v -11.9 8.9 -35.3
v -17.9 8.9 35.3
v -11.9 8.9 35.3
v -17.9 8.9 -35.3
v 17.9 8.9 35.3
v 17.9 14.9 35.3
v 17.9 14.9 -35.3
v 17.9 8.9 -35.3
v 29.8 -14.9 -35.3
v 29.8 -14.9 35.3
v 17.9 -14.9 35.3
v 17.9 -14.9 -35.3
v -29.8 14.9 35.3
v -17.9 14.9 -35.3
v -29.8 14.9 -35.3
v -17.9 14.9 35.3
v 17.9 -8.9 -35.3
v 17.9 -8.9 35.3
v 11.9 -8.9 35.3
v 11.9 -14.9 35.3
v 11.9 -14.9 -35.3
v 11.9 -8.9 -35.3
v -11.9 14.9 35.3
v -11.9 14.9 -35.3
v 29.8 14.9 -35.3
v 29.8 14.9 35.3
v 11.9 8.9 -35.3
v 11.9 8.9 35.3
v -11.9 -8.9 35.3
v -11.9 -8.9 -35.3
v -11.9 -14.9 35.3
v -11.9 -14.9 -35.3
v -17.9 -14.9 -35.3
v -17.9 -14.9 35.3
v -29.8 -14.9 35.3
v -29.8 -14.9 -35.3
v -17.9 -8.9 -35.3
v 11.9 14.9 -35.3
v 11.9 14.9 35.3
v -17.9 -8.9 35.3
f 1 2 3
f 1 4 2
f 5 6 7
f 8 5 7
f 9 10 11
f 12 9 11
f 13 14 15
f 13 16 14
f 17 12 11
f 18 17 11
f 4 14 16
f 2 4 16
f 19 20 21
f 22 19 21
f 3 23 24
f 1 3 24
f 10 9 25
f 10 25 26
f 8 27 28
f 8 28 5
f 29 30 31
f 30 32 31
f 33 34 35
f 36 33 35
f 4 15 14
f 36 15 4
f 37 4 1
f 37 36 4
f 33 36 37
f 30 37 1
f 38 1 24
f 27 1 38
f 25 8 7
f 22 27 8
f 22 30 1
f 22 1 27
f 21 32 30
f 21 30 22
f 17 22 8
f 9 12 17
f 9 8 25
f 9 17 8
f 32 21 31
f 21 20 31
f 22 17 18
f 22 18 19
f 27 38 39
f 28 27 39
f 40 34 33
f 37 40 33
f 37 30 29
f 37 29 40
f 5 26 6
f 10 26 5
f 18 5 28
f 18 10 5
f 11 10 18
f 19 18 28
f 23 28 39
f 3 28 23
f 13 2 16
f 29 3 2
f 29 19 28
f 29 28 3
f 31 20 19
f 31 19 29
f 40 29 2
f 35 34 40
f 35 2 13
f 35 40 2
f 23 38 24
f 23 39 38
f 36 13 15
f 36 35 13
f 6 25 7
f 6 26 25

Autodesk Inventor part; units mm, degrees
ref_plane "YZ Plane" through (0, 0, 0) normal (1, 0, 0) x (0, 1, 0)
ref_plane "XZ Plane" through (0, 0, 0) normal (0, 1, 0) x (-1, 0, 0)
ref_plane "XY Plane" through (0, 0, 0) normal (0, 0, 1) x (1, 0, 0)
sketch "Sketch1" plane through (0, 0, 0) normal (0, 1, 0) x (-1, 0, 0)
  line L0 (-29.8, 35.3) -> (29.8, 35.3)
  line L1 (29.8, 35.3) -> (29.8, -35.3)
  line L2 (29.8, -35.3) -> (-29.8, -35.3)
  line L3 (-29.8, -35.3) -> (-29.8, 35.3)
  line L4 (-29.8, 35.3) -> (29.8, -35.3) construction
  line L5 (29.8, 35.3) -> (-29.8, -35.3) construction
  point P0 (0, 0)
  dimension "d0" = 70.6
  dimension "d1" = 59.6
extrude "Extrusion1" add sketch "Sketch1" along normal mid plane 29.8
sketch "Sketch2" plane through (0, 14.9, 0) normal (0, 1, 0) x (1, 0, 0)
  line L0 (-29.8, -35.3) -> (29.8, -35.3) projected
  line L1 (29.8, 35.3) -> (-29.8, 35.3) projected
  line L2 (-17.9, -35.3) -> (-11.9, -35.3)
  line L3 (-11.9, -35.3) -> (-11.9, 35.3)
  line L4 (-11.9, 35.3) -> (-17.9, 35.3)
  line L5 (-17.9, 35.3) -> (-17.9, -35.3)
  line L6 (11.9, -35.3) -> (17.9, -35.3)
  line L7 (17.9, -35.3) -> (17.9, 35.3)
  line L8 (17.9, 35.3) -> (11.9, 35.3)
  line L9 (11.9, 35.3) -> (11.9, -35.3)
  line L10 (-29.8, 35.3) -> (-29.8, -35.3) projected
  line L11 (0, -35.3) -> (0, 35.3) construction
  point P0 (0, 0)
  dimension "d4" = 6
  dimension "d5" = 11.9
extrude "Extrusion2" cut sketch "Sketch2" against normal blind 6 contours L5 L1 L3 L0 | L9 L1 L7 L0
mirror "Mirror1" about plane through (0, 0, 0) normal (0, 1, 0) of "Extrusion2"
properties part number "Linear Rail Carriage"
